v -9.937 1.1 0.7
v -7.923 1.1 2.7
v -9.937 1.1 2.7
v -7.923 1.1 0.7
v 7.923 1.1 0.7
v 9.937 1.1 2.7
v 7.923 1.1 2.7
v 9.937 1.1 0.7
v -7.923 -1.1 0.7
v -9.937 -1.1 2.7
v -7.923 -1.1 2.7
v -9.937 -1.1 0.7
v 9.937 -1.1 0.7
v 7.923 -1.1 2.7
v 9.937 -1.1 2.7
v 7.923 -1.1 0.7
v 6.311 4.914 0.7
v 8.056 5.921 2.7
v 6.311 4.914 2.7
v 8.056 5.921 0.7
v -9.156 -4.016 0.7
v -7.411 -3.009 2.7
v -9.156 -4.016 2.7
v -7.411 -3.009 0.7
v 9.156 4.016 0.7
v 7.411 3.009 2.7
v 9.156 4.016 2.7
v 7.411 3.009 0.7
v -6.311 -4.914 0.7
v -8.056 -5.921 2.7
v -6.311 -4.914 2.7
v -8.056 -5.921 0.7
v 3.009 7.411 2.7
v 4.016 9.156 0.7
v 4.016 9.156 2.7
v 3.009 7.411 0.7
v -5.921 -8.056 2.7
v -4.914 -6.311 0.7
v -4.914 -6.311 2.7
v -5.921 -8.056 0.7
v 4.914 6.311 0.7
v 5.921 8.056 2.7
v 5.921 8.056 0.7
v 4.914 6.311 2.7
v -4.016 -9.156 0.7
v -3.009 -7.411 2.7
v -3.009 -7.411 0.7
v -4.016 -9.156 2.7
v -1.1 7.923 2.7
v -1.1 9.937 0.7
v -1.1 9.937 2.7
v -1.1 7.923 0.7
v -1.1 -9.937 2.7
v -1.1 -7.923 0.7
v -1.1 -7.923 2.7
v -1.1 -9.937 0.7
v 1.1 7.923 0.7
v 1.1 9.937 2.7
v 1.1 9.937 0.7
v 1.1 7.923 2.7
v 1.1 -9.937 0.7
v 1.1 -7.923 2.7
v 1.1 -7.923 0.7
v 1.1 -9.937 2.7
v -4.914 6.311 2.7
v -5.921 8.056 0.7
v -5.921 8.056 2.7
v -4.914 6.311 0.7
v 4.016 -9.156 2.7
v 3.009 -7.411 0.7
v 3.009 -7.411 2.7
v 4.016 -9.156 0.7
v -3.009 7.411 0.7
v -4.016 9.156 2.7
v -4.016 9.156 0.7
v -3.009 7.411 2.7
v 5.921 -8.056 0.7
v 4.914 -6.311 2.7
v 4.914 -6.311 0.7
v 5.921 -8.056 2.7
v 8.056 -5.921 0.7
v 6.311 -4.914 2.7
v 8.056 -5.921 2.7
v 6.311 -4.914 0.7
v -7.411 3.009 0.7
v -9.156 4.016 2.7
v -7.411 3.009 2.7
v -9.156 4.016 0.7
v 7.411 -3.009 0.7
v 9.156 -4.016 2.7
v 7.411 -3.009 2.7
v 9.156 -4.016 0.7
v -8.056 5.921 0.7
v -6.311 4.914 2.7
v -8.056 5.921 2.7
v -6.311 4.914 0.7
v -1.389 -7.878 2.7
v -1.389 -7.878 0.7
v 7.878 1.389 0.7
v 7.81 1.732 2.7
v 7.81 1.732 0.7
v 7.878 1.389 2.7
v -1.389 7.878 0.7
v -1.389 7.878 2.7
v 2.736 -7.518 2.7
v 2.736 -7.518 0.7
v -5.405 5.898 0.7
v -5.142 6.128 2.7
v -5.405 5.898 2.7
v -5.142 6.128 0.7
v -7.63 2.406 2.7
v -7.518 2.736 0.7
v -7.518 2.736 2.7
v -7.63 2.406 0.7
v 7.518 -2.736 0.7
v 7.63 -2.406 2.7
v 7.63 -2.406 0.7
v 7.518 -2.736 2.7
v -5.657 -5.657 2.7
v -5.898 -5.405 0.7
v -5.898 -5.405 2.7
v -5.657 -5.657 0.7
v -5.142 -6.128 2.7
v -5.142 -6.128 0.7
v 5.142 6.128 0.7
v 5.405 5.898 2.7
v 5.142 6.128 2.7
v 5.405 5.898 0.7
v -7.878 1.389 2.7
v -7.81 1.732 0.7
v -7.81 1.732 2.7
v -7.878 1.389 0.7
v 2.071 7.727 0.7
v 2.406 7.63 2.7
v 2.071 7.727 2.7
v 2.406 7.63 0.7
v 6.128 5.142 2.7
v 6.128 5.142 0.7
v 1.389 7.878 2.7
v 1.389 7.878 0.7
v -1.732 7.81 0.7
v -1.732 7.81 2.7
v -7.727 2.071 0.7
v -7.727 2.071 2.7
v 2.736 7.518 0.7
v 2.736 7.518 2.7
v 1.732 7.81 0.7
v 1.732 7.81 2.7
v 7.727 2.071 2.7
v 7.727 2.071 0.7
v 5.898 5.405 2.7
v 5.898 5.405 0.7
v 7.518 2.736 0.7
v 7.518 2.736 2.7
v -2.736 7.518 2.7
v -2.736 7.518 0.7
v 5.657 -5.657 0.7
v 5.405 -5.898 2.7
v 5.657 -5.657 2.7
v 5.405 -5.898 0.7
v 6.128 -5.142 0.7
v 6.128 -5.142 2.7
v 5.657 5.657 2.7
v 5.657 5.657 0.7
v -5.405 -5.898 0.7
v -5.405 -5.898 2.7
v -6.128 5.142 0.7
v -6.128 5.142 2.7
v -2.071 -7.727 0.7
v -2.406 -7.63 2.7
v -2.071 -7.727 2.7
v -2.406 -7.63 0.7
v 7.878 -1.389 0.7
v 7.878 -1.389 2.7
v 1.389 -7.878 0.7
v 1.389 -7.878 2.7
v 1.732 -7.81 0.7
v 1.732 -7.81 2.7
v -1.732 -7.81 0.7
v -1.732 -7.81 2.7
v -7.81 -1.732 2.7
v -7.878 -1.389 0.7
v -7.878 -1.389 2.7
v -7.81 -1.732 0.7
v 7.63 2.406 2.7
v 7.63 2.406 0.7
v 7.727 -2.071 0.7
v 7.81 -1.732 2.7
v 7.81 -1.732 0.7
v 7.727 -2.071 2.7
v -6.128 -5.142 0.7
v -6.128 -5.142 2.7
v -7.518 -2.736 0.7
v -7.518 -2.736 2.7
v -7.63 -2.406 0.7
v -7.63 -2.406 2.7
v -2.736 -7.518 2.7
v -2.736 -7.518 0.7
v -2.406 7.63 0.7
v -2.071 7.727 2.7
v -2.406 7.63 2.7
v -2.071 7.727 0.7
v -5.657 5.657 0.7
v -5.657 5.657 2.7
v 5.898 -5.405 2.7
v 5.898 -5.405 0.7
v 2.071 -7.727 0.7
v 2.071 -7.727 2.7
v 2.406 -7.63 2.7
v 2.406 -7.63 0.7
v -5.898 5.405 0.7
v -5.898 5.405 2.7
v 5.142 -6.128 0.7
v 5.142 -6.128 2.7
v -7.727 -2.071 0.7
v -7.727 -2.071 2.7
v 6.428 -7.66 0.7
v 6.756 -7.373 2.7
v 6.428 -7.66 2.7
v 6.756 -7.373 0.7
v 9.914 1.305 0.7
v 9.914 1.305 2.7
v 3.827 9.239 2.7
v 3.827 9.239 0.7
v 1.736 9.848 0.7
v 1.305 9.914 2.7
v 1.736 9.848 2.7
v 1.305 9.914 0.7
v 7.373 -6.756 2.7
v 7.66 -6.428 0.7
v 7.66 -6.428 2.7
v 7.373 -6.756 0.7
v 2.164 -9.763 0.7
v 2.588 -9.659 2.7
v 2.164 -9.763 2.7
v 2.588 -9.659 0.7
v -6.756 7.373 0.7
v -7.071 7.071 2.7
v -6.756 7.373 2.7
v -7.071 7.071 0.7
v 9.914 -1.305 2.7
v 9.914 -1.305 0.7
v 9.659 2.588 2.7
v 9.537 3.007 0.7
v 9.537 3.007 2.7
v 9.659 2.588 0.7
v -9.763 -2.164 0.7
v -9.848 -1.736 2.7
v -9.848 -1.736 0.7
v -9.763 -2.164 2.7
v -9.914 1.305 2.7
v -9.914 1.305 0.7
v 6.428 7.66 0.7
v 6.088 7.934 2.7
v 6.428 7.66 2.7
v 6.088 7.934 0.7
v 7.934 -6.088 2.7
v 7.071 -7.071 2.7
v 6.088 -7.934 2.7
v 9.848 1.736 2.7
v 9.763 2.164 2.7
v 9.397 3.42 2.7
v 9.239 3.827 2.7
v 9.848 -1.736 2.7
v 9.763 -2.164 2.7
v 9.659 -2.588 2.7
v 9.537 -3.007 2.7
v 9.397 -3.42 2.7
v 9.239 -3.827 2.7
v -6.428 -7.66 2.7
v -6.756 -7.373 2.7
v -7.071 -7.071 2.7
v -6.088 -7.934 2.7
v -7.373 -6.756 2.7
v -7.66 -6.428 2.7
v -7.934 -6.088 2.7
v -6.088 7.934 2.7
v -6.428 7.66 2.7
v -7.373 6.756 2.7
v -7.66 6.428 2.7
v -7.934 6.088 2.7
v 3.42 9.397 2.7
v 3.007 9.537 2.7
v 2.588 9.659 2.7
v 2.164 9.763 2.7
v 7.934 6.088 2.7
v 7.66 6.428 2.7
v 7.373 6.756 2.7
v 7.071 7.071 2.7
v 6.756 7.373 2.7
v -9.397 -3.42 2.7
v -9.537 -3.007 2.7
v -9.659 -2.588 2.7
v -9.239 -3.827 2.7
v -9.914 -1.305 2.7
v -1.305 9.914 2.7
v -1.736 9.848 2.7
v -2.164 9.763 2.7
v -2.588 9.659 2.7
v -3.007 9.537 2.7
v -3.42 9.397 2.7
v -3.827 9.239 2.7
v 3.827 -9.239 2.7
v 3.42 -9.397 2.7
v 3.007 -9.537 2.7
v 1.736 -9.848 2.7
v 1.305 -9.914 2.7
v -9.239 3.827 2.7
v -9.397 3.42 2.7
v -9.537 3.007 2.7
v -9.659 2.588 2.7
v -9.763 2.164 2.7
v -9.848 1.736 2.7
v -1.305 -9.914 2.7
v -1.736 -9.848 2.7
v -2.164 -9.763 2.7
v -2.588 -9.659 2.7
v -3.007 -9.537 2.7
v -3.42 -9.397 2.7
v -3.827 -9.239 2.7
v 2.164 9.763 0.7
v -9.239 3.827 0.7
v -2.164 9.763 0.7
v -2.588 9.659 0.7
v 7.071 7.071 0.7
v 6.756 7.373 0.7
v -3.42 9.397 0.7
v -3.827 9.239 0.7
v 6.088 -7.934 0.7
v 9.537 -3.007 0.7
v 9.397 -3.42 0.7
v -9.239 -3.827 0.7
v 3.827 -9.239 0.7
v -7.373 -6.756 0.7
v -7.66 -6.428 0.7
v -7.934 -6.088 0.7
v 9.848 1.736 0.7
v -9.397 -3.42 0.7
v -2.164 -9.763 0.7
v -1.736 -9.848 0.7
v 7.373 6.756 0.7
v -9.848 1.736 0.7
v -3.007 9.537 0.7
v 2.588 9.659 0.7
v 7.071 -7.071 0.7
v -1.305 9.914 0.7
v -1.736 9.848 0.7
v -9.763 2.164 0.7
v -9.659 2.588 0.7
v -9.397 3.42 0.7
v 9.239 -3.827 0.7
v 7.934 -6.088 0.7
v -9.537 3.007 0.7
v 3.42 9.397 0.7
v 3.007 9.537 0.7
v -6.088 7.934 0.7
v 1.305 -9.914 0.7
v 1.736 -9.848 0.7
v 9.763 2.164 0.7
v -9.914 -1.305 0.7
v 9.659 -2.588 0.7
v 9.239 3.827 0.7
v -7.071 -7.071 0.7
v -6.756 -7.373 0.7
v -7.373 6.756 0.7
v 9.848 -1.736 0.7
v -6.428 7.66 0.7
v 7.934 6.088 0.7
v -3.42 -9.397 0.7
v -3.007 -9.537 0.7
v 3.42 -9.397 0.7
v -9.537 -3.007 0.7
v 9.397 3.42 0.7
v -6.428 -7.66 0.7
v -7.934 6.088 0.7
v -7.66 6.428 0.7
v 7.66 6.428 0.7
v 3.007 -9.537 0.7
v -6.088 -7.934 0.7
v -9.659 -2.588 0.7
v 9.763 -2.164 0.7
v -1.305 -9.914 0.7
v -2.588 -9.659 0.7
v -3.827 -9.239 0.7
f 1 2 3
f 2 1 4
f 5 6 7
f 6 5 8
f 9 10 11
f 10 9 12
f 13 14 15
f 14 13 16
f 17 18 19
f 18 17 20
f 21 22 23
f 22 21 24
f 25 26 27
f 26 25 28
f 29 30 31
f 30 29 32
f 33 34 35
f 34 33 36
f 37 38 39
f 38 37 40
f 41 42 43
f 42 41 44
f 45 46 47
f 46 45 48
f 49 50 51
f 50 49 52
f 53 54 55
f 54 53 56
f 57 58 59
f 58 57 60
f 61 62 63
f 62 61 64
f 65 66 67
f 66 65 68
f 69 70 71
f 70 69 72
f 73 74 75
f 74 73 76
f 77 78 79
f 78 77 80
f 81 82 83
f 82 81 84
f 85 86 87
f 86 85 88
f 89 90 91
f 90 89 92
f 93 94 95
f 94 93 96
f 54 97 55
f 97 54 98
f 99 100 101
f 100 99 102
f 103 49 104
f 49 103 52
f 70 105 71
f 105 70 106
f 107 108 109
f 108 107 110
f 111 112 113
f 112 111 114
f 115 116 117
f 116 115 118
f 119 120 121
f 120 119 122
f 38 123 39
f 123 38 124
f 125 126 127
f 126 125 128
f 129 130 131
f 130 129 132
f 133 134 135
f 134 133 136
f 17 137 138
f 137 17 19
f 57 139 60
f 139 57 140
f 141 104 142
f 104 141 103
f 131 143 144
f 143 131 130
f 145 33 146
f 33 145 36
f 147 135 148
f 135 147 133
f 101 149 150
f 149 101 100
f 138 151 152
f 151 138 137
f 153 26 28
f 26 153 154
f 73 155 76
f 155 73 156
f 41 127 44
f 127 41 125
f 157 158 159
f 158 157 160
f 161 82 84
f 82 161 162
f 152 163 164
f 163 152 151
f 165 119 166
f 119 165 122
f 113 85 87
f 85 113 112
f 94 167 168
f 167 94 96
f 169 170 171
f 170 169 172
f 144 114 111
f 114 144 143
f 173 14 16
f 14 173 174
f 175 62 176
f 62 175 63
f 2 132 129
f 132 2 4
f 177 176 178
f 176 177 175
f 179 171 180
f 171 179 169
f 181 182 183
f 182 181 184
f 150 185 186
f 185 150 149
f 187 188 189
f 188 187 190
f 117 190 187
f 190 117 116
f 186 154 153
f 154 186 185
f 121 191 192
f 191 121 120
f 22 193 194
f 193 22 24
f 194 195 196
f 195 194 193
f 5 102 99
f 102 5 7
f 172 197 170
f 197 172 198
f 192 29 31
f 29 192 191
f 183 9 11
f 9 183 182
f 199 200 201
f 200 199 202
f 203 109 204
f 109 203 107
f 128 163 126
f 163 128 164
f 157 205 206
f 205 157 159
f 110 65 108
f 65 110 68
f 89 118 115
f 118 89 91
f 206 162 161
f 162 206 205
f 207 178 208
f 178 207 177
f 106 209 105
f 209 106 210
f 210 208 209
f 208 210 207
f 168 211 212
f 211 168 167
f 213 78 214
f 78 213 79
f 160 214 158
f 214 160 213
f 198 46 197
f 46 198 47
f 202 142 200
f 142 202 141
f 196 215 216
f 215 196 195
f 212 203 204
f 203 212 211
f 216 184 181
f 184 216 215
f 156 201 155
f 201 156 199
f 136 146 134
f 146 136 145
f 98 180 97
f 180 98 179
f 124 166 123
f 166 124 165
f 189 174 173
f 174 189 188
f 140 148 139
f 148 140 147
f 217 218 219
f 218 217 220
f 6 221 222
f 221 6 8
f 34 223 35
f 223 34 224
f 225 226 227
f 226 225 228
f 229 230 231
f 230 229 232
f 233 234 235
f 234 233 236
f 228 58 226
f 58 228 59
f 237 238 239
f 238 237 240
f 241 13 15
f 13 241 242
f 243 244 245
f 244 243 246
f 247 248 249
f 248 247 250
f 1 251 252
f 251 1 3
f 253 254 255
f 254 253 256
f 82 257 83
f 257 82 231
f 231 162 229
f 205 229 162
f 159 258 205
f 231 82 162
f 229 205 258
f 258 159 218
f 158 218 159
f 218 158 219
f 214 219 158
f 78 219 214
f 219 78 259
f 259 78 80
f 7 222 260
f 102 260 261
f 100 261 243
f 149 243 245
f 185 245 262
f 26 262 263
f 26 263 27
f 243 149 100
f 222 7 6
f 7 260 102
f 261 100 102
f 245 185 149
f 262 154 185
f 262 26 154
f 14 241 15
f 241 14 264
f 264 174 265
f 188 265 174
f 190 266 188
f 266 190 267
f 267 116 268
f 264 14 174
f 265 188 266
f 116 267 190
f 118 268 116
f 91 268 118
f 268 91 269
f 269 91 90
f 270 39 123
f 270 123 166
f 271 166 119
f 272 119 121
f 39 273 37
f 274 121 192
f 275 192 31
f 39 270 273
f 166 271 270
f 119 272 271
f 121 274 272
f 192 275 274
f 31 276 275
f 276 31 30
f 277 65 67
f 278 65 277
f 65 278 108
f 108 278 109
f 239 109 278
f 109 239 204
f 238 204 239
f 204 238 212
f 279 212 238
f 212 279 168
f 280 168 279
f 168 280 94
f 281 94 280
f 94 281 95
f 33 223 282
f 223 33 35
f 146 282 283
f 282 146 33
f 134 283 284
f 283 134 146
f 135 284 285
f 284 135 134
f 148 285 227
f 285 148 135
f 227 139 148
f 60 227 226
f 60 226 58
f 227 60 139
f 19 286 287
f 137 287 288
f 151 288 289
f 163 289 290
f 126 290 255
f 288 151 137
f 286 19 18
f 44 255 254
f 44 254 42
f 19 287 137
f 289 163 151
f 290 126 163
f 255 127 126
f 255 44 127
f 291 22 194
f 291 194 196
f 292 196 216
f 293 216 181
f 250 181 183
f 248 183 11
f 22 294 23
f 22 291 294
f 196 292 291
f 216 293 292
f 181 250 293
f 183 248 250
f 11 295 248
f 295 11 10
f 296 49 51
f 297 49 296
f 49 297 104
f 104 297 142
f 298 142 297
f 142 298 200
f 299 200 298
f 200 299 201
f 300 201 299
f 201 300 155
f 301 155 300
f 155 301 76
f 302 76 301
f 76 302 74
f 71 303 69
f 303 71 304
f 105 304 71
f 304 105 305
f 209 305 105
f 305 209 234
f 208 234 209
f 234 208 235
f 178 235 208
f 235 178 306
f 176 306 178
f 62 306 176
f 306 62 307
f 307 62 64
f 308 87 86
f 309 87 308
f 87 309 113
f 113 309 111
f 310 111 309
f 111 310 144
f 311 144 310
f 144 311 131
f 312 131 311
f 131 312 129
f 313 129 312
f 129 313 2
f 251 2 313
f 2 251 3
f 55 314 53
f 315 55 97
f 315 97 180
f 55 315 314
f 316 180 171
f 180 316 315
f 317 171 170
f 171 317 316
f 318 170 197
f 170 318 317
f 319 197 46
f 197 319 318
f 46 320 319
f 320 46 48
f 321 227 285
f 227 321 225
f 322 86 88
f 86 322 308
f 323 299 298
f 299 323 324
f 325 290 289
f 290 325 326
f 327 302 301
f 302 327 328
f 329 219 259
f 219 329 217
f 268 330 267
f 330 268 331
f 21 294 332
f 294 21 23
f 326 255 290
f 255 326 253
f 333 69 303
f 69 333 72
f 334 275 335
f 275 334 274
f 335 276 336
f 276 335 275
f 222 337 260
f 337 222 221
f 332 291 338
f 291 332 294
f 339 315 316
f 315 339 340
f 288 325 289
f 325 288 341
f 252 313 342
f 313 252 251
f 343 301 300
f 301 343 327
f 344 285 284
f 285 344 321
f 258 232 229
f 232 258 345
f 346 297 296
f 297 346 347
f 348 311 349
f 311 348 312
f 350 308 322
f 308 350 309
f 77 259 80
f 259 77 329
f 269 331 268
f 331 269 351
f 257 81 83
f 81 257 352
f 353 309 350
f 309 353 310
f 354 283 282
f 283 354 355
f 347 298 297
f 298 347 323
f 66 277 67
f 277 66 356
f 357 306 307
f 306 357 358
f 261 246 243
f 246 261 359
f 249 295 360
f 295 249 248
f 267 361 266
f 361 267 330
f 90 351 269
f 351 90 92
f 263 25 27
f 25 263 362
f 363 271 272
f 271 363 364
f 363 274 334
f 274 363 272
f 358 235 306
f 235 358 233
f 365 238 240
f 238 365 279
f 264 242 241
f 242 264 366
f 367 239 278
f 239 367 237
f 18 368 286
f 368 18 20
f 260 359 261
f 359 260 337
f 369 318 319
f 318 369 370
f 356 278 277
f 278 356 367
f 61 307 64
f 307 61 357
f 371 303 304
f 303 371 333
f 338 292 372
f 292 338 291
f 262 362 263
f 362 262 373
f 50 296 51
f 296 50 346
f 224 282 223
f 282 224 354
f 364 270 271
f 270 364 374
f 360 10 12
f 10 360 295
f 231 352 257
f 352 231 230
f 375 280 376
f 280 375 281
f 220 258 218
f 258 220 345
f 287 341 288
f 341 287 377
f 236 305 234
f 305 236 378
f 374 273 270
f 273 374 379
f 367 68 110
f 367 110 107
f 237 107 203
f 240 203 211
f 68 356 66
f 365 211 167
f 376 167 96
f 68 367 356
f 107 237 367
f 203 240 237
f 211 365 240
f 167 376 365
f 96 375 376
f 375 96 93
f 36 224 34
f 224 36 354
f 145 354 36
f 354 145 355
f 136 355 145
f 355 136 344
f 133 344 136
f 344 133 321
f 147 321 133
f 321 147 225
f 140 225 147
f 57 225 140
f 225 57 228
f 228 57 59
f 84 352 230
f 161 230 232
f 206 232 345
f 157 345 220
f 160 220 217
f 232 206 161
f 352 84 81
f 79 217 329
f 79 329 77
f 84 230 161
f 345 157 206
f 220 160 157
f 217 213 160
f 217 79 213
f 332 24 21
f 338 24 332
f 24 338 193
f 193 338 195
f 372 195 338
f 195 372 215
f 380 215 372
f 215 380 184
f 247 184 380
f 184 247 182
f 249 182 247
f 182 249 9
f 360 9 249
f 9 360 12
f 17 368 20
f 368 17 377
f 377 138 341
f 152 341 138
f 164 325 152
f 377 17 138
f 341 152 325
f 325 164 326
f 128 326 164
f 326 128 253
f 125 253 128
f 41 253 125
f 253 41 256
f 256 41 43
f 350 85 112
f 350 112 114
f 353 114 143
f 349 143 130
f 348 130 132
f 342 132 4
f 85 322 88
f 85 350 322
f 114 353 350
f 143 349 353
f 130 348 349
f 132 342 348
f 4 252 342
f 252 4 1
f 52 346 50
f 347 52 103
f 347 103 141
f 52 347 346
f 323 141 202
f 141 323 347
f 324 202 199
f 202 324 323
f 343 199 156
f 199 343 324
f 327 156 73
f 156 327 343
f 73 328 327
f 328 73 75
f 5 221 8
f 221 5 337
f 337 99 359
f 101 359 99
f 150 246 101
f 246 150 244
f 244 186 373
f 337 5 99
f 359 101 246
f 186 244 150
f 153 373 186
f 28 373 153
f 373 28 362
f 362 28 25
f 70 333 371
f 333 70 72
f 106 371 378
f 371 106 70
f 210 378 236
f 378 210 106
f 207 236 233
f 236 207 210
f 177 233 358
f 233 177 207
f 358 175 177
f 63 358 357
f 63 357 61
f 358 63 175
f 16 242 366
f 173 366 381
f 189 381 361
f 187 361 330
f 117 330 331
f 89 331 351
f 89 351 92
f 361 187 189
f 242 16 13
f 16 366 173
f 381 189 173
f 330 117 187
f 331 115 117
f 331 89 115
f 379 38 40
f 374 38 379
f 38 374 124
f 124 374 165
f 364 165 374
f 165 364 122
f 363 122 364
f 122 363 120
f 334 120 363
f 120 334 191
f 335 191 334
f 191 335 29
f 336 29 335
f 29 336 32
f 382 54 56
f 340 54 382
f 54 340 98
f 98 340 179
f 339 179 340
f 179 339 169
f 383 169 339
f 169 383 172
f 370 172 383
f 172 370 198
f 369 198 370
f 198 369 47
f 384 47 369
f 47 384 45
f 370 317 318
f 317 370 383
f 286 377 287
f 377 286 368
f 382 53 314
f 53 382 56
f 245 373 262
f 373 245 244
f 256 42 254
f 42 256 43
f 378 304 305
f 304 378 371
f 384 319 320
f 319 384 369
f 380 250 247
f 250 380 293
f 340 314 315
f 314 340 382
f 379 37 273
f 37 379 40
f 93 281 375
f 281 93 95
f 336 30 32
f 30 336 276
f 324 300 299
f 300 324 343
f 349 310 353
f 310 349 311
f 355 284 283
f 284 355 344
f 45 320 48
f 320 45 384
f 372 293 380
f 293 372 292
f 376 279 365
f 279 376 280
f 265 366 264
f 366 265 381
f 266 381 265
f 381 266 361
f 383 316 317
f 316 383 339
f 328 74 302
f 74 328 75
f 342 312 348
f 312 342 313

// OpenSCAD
// file: ../../c3d_params.scad
$fn=144;

nozzle = 0.4;

base_radius = 10;
base_thickness = 2;
base_segment_length = 20;
base_segment_width = 5;
base_tile_side = nozzle+base_segment_length+2*base_radius;
// main file
include <../../c3d_params.scad>;

module metropoly() {
  difference() {
    union(){
      difference(){
          translate([0,0,-4.5])cylinder(r=base_radius,h=4+3*nozzle);
          for (i=[0:5]){
              rotate([0,0,i*60]) translate([.75*base_radius,0,-4.5]) {
              translate([1.5,0,3.5]) rotate([0,90,0]) cylinder(r=1.5-nozzle,h=1.5*base_radius);
              translate([1.5,-1.5+nozzle,3.5-(2.32/2+(1.5-nozzle))]) cube([1.5*base_radius,3-nozzle*2,2.32]);
              }
          }
      }
      for (i=[0:5]){
          rotate([0,0,i*60]) translate([.75*base_radius,0,-4.5]) {
              translate([1.5,(-1.5+nozzle)-((3.25-nozzle*2)-(3-nozzle*2))/2,3.5-(2.32/2+(1.5-nozzle)+0.25)]) cube([.12*base_radius,3.25-nozzle*2,0.25]);
              }
          }
      translate([0,0,-7.5]) cylinder(r1=2+.6*base_radius, r2=base_radius, h=3); 
      translate([0,0,-7.5-2*nozzle]) cylinder(r=2+.6*base_radius,h=2*nozzle);
      }
    translate([0,0,-9]) cylinder(r=.6*base_radius+.5*nozzle,h=9);
  }
}
  translate([0,0,-.5+3*nozzle]) difference() {
    cylinder(r=base_radius,h=2);
    translate([0,0,-.5]) union() {
      for (i = [0:11]) {
        rotate([0,0,i*30]) translate([-10,-1.1,0]) cube([20,2.2,3]);
      }
      cylinder(r=base_radius-2,h=3);
    }
  }
